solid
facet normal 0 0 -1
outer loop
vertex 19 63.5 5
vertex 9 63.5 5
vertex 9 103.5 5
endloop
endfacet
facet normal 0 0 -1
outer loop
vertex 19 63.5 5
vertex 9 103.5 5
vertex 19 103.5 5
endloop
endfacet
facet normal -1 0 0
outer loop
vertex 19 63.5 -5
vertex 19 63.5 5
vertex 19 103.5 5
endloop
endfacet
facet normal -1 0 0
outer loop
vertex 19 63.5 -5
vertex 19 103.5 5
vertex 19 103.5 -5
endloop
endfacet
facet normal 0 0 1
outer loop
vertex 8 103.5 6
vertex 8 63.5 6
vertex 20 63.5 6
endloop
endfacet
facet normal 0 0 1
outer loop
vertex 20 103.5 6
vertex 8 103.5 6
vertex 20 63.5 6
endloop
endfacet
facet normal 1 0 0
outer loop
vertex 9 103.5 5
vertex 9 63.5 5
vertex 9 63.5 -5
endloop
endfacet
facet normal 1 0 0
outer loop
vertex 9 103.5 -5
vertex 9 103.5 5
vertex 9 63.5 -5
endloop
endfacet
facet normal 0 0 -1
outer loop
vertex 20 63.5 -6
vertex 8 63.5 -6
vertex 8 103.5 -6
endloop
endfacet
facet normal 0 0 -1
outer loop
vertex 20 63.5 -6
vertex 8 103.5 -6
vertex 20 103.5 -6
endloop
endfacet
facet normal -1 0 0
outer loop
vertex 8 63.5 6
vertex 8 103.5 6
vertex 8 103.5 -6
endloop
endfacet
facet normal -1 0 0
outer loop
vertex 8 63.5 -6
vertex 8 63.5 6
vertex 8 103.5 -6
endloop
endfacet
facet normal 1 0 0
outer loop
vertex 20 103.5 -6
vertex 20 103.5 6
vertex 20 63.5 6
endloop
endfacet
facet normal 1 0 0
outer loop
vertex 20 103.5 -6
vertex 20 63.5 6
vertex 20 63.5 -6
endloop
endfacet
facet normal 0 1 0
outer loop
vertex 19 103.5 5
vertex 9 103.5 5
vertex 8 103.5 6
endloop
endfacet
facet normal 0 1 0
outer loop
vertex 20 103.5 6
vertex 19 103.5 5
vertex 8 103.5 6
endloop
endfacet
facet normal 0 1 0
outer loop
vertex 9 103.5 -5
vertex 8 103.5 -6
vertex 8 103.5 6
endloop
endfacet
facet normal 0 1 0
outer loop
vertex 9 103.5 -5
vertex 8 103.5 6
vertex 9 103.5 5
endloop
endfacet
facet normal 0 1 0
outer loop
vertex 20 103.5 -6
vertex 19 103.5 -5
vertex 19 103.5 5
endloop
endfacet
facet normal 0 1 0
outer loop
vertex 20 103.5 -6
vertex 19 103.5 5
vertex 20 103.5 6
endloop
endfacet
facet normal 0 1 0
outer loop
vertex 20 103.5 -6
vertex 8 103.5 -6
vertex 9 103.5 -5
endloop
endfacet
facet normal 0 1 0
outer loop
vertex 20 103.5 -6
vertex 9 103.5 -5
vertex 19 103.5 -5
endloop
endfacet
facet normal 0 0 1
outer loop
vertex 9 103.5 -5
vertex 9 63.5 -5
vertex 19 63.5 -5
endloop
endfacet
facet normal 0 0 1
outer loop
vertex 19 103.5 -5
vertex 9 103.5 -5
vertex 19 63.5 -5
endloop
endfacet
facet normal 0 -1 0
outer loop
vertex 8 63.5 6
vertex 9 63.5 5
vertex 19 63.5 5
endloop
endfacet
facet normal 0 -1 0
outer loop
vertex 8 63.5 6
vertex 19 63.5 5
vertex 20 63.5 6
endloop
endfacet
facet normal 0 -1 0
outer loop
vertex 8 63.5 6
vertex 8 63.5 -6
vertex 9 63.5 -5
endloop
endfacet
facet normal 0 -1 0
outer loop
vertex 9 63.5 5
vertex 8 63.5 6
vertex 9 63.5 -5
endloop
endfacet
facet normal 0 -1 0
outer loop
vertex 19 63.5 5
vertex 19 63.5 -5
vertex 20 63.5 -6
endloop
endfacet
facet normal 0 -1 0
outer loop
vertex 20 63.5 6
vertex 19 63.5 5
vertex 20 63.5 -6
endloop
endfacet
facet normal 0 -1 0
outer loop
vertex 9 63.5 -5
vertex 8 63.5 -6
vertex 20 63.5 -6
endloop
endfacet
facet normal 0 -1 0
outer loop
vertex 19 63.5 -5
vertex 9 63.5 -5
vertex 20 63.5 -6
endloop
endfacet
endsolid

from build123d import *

# Parameters (mm, degrees)
CHANNEL_START              = 63.5
SKETCH1_W                  = 12
SKETCH1_H                  = 12
CHANNEL_DEPTH              = 40
LIGHT_PATH_10MM_DEPTH      = 106.585273594
LIGHT_PATH_10MM_DEPTH_BACK = 106.585273594
SKETCH2_W                  = 10
SKETCH2_H                  = 10


with BuildPart() as part:
    # Sketch1 → Channel (new body)
    with BuildSketch(Plane(origin=(0, 0, 0), x_dir=(1, 0, 0), z_dir=(0, 1, 0)).offset(CHANNEL_START)):
        with Locations((14, 0)):
            Rectangle(SKETCH1_W, SKETCH1_H)
    extrude(amount=CHANNEL_DEPTH)

    # Sketch2 → Light_Path_10mm (cut, two sides: drawn at the far end of the back side and taken through both)
    with BuildSketch(Plane(origin=(0, 0, 0), x_dir=(1, 0, 0), z_dir=(0, 1, 0)).offset(-LIGHT_PATH_10MM_DEPTH_BACK)):
        with Locations((14, 0)):
            Rectangle(SKETCH2_W, SKETCH2_H)
    extrude(amount=LIGHT_PATH_10MM_DEPTH + LIGHT_PATH_10MM_DEPTH_BACK, mode=Mode.SUBTRACT)


solid = part.part
